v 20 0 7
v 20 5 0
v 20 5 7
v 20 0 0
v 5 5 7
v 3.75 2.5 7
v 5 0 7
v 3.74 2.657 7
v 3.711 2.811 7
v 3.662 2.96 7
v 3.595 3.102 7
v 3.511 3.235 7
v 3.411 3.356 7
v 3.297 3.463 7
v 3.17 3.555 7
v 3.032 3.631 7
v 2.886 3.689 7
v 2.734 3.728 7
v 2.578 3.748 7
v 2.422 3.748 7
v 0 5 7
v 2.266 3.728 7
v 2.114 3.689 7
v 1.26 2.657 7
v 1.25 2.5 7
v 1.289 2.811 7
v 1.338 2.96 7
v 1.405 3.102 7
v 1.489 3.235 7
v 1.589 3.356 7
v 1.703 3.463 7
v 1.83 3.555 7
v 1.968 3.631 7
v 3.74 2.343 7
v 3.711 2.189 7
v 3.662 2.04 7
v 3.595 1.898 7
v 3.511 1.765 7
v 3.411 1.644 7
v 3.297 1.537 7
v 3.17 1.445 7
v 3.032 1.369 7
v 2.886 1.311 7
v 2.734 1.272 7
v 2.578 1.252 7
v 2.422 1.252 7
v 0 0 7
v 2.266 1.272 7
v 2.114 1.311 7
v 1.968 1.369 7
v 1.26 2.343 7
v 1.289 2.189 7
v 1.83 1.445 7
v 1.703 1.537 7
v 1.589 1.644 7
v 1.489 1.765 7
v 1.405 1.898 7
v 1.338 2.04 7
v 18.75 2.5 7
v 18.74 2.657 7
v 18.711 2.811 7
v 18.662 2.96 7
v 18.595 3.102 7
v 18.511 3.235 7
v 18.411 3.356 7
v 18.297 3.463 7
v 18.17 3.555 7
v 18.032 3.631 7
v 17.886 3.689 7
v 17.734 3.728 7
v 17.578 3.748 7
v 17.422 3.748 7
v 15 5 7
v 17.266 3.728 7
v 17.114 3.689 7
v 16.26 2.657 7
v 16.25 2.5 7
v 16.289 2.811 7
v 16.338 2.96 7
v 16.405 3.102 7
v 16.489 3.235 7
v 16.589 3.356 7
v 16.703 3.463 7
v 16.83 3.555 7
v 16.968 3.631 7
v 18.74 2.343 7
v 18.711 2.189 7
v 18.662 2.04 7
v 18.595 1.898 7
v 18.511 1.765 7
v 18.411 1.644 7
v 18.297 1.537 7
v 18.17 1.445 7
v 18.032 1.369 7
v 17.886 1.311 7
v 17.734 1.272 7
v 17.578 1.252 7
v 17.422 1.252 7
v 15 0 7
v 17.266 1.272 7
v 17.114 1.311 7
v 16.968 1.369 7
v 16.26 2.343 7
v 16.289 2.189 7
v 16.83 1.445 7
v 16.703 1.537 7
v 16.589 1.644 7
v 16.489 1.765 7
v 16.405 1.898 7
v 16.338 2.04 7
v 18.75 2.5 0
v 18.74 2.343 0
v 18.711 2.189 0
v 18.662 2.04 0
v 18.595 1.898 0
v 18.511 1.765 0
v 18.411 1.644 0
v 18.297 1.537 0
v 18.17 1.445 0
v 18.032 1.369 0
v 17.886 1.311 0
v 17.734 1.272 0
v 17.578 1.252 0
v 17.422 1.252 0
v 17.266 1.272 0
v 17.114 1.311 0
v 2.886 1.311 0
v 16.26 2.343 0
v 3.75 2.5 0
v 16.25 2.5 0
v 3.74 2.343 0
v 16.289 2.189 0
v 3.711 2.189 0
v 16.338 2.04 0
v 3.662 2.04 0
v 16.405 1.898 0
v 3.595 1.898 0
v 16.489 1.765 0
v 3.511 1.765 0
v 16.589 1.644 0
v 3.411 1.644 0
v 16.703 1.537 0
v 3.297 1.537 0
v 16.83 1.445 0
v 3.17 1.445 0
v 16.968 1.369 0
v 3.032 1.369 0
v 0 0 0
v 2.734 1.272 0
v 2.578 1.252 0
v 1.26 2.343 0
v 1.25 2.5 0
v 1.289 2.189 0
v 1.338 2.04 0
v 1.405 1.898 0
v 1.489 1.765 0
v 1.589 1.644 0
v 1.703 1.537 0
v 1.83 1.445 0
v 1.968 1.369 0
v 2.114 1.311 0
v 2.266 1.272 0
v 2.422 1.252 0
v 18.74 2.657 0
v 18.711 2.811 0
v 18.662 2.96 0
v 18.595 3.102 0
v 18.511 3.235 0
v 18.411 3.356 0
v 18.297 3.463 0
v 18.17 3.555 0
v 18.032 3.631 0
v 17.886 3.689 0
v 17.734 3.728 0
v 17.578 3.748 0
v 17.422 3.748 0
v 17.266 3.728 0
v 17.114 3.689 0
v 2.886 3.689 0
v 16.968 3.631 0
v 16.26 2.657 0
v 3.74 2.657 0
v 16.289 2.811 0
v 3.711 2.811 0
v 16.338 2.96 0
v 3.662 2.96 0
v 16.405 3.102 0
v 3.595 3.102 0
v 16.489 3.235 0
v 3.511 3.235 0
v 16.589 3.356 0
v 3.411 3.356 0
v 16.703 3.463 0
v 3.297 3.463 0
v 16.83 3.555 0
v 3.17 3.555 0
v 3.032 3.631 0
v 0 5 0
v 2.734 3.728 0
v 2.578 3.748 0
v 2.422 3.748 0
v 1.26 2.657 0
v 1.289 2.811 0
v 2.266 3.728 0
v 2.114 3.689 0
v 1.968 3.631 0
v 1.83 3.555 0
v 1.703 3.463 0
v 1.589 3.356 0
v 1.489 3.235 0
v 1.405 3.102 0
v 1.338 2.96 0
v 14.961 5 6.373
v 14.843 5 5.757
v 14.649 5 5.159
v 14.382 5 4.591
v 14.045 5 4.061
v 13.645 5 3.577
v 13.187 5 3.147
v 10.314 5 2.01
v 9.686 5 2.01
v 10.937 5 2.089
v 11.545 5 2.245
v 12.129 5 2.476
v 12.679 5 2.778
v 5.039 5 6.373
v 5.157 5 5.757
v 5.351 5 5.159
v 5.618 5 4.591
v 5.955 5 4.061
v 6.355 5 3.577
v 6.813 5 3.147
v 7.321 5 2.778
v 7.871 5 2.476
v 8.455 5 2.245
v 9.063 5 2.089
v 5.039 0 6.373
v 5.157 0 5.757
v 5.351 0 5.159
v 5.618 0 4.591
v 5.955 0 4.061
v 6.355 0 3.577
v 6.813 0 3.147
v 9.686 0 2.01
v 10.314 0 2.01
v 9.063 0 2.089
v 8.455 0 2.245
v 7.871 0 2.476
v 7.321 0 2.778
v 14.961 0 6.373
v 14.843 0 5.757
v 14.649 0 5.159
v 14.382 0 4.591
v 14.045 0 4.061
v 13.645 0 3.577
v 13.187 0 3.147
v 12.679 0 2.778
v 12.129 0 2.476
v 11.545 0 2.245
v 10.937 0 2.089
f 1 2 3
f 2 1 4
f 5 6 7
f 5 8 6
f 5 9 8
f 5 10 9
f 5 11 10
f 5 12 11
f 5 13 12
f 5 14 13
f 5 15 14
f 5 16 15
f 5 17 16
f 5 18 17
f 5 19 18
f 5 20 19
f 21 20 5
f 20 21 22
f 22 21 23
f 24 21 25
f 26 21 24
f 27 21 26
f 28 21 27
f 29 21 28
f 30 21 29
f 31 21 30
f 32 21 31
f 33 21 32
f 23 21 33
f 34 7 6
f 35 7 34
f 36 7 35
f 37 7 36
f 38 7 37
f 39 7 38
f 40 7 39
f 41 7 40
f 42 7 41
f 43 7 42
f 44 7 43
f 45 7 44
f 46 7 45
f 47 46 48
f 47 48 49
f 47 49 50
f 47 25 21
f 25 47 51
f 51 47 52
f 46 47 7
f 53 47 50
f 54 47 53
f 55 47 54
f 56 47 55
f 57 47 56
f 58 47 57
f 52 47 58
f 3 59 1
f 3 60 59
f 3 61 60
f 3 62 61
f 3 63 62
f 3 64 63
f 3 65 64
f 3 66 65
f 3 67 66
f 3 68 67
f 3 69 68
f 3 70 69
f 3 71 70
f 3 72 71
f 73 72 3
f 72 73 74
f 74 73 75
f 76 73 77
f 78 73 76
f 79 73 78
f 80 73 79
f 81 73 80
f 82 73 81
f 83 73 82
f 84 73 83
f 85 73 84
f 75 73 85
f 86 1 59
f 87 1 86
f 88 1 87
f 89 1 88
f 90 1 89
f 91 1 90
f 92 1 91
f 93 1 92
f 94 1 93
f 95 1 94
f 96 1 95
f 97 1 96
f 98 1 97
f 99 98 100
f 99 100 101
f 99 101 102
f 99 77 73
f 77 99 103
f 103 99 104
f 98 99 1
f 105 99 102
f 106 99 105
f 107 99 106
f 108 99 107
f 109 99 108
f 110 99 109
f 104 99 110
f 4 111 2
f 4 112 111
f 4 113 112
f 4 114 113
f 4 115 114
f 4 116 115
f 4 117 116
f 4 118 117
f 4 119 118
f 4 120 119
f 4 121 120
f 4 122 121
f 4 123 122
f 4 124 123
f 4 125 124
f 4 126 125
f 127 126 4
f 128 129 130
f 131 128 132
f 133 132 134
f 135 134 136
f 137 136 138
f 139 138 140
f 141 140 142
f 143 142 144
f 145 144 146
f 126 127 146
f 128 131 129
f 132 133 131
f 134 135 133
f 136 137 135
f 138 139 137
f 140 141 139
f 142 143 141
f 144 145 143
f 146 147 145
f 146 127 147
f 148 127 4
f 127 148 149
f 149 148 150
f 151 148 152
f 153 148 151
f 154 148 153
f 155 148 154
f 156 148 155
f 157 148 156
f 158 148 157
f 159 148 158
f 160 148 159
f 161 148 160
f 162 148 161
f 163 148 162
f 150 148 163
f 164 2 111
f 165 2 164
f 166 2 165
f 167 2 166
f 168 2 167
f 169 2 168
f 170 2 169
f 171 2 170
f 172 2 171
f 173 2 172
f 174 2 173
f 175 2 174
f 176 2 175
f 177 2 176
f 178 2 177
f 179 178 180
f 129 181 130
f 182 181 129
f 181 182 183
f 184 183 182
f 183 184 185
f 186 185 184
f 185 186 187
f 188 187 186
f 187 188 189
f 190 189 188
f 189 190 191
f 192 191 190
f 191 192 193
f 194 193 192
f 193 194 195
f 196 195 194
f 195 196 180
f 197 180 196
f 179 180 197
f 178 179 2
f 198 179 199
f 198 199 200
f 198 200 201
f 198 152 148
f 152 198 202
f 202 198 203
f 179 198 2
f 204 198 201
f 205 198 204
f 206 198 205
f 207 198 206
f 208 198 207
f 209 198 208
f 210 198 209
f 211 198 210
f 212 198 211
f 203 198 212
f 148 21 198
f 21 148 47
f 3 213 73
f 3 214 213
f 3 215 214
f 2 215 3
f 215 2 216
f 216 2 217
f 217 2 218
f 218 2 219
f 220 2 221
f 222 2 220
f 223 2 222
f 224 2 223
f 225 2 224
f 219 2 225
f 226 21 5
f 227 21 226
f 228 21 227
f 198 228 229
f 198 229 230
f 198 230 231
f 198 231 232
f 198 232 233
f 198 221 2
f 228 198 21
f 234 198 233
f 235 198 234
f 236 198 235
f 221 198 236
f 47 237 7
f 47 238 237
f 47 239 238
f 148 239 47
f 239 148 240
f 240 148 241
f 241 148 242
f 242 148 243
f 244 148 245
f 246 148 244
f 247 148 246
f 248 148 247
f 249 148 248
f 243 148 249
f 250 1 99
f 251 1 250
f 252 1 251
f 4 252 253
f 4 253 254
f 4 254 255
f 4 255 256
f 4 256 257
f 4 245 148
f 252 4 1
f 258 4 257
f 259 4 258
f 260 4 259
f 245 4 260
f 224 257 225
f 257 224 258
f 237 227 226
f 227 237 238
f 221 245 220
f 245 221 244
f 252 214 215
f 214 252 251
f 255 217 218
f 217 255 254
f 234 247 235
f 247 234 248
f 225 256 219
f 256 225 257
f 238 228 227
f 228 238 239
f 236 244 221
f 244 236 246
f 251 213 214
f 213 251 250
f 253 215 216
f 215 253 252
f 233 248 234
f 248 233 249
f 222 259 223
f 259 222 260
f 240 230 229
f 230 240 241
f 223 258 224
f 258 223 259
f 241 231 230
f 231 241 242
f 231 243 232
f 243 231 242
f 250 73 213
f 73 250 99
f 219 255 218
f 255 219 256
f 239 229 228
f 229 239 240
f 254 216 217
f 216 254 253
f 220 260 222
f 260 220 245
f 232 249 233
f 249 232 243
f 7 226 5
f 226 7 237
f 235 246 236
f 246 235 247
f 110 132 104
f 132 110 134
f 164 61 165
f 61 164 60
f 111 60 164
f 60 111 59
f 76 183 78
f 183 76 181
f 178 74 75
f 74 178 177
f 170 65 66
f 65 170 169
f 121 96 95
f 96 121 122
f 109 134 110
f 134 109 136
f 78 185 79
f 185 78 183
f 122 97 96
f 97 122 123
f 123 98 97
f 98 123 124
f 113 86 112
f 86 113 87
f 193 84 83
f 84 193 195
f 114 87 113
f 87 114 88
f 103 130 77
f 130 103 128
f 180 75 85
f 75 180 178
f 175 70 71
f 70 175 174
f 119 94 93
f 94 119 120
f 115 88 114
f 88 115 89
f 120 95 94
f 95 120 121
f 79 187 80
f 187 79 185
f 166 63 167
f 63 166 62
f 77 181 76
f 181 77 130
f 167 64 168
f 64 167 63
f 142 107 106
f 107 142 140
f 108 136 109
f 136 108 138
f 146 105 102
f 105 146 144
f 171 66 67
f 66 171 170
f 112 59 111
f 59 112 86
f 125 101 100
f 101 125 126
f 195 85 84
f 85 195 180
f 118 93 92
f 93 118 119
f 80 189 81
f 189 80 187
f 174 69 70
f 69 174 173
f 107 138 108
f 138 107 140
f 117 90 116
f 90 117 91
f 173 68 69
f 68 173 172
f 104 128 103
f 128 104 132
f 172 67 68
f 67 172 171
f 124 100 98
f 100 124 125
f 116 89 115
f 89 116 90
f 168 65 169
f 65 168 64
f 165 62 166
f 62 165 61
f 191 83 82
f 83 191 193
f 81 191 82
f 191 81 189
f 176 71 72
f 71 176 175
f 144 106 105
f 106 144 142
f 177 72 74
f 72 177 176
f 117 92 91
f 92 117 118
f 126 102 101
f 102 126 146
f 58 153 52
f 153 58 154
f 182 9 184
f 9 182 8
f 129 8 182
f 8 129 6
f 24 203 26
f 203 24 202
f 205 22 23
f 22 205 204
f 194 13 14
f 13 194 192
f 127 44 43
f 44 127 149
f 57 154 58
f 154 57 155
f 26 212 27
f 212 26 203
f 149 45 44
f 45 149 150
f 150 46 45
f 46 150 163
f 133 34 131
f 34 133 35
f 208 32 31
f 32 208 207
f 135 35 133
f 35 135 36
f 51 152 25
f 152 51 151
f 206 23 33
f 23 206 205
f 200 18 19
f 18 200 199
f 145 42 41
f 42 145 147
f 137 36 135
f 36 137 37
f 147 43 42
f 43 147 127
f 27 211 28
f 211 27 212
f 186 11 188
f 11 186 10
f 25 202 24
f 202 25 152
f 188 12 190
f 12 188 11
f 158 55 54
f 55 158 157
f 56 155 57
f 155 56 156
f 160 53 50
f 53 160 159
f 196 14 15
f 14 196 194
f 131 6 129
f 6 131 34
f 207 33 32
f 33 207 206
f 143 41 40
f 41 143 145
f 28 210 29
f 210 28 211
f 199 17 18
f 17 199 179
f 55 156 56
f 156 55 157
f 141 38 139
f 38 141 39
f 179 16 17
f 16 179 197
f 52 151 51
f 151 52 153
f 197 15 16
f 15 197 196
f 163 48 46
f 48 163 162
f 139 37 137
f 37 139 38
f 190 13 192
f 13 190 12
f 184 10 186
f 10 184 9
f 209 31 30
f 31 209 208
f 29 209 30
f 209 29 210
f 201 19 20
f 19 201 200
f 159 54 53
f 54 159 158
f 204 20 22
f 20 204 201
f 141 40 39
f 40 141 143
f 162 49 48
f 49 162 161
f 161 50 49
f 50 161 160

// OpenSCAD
/*
Copyright 2018 Michael Gläser

Licensed under the Apache License, Version 2.0 (the "License");
you may not use this file except in compliance with the License.
You may obtain a copy of the License at

    http://www.apache.org/licenses/LICENSE-2.0

Unless required by applicable law or agreed to in writing, software
distributed under the License is distributed on an "AS IS" BASIS,
WITHOUT WARRANTIES OR CONDITIONS OF ANY KIND, either express or implied.
See the License for the specific language governing permissions and
limitations under the License.
*/

$fn=50;

module cableClamp(
cableDiameter,
screwDiameter,
screwDistance,
width,
depth,
height,
ingress=0 // ingress of cable - 0 .. half cable
) {
    if (cableDiameter==undef) {
        echo("cableDiameter is not set.");
        cableDiameter=10;
    };
    if (screwDiameter==undef) echo("screwDiameter is not set.");
    screwDistance= (screwDistance==undef) ? 2*cableDiameter:screwDistance;
    width= (width==undef) ? 3*cableDiameter : width;
    depth= (depth==undef) ? 2*screwDiameter : depth;
    height= (height==undef) ? .75*cableDiameter : height;
    
    difference() {
        // body
        cube([width,depth,height]);
        
        // cable
		rotate([90,0,0]) {
        translate([width/2,height-ingress,-depth]) {
            cylinder(h=depth, r=cableDiameter/2);
        };
        };
        // cable bay
        translate([width/2-cableDiameter/2,0,height-ingress]) {
            cube([cableDiameter,depth,ingress]);
        };
        // right screw
        translate([width/2+screwDistance/2,depth/2,0]) {
            cylinder(h=height, r=screwDiameter/2);
        };
        // left screw
        translate([width/2-screwDistance/2,depth/2,0]) {
            cylinder(h=height, r=screwDiameter/2);
        };
    };
};

//minkowski() {
cableClamp(
cableDiameter=10,
screwDiameter=2.5,
screwDistance=15,
width=20,
height=7,
ingress=0);
//    cylinder(r=2,h=1);
//};
